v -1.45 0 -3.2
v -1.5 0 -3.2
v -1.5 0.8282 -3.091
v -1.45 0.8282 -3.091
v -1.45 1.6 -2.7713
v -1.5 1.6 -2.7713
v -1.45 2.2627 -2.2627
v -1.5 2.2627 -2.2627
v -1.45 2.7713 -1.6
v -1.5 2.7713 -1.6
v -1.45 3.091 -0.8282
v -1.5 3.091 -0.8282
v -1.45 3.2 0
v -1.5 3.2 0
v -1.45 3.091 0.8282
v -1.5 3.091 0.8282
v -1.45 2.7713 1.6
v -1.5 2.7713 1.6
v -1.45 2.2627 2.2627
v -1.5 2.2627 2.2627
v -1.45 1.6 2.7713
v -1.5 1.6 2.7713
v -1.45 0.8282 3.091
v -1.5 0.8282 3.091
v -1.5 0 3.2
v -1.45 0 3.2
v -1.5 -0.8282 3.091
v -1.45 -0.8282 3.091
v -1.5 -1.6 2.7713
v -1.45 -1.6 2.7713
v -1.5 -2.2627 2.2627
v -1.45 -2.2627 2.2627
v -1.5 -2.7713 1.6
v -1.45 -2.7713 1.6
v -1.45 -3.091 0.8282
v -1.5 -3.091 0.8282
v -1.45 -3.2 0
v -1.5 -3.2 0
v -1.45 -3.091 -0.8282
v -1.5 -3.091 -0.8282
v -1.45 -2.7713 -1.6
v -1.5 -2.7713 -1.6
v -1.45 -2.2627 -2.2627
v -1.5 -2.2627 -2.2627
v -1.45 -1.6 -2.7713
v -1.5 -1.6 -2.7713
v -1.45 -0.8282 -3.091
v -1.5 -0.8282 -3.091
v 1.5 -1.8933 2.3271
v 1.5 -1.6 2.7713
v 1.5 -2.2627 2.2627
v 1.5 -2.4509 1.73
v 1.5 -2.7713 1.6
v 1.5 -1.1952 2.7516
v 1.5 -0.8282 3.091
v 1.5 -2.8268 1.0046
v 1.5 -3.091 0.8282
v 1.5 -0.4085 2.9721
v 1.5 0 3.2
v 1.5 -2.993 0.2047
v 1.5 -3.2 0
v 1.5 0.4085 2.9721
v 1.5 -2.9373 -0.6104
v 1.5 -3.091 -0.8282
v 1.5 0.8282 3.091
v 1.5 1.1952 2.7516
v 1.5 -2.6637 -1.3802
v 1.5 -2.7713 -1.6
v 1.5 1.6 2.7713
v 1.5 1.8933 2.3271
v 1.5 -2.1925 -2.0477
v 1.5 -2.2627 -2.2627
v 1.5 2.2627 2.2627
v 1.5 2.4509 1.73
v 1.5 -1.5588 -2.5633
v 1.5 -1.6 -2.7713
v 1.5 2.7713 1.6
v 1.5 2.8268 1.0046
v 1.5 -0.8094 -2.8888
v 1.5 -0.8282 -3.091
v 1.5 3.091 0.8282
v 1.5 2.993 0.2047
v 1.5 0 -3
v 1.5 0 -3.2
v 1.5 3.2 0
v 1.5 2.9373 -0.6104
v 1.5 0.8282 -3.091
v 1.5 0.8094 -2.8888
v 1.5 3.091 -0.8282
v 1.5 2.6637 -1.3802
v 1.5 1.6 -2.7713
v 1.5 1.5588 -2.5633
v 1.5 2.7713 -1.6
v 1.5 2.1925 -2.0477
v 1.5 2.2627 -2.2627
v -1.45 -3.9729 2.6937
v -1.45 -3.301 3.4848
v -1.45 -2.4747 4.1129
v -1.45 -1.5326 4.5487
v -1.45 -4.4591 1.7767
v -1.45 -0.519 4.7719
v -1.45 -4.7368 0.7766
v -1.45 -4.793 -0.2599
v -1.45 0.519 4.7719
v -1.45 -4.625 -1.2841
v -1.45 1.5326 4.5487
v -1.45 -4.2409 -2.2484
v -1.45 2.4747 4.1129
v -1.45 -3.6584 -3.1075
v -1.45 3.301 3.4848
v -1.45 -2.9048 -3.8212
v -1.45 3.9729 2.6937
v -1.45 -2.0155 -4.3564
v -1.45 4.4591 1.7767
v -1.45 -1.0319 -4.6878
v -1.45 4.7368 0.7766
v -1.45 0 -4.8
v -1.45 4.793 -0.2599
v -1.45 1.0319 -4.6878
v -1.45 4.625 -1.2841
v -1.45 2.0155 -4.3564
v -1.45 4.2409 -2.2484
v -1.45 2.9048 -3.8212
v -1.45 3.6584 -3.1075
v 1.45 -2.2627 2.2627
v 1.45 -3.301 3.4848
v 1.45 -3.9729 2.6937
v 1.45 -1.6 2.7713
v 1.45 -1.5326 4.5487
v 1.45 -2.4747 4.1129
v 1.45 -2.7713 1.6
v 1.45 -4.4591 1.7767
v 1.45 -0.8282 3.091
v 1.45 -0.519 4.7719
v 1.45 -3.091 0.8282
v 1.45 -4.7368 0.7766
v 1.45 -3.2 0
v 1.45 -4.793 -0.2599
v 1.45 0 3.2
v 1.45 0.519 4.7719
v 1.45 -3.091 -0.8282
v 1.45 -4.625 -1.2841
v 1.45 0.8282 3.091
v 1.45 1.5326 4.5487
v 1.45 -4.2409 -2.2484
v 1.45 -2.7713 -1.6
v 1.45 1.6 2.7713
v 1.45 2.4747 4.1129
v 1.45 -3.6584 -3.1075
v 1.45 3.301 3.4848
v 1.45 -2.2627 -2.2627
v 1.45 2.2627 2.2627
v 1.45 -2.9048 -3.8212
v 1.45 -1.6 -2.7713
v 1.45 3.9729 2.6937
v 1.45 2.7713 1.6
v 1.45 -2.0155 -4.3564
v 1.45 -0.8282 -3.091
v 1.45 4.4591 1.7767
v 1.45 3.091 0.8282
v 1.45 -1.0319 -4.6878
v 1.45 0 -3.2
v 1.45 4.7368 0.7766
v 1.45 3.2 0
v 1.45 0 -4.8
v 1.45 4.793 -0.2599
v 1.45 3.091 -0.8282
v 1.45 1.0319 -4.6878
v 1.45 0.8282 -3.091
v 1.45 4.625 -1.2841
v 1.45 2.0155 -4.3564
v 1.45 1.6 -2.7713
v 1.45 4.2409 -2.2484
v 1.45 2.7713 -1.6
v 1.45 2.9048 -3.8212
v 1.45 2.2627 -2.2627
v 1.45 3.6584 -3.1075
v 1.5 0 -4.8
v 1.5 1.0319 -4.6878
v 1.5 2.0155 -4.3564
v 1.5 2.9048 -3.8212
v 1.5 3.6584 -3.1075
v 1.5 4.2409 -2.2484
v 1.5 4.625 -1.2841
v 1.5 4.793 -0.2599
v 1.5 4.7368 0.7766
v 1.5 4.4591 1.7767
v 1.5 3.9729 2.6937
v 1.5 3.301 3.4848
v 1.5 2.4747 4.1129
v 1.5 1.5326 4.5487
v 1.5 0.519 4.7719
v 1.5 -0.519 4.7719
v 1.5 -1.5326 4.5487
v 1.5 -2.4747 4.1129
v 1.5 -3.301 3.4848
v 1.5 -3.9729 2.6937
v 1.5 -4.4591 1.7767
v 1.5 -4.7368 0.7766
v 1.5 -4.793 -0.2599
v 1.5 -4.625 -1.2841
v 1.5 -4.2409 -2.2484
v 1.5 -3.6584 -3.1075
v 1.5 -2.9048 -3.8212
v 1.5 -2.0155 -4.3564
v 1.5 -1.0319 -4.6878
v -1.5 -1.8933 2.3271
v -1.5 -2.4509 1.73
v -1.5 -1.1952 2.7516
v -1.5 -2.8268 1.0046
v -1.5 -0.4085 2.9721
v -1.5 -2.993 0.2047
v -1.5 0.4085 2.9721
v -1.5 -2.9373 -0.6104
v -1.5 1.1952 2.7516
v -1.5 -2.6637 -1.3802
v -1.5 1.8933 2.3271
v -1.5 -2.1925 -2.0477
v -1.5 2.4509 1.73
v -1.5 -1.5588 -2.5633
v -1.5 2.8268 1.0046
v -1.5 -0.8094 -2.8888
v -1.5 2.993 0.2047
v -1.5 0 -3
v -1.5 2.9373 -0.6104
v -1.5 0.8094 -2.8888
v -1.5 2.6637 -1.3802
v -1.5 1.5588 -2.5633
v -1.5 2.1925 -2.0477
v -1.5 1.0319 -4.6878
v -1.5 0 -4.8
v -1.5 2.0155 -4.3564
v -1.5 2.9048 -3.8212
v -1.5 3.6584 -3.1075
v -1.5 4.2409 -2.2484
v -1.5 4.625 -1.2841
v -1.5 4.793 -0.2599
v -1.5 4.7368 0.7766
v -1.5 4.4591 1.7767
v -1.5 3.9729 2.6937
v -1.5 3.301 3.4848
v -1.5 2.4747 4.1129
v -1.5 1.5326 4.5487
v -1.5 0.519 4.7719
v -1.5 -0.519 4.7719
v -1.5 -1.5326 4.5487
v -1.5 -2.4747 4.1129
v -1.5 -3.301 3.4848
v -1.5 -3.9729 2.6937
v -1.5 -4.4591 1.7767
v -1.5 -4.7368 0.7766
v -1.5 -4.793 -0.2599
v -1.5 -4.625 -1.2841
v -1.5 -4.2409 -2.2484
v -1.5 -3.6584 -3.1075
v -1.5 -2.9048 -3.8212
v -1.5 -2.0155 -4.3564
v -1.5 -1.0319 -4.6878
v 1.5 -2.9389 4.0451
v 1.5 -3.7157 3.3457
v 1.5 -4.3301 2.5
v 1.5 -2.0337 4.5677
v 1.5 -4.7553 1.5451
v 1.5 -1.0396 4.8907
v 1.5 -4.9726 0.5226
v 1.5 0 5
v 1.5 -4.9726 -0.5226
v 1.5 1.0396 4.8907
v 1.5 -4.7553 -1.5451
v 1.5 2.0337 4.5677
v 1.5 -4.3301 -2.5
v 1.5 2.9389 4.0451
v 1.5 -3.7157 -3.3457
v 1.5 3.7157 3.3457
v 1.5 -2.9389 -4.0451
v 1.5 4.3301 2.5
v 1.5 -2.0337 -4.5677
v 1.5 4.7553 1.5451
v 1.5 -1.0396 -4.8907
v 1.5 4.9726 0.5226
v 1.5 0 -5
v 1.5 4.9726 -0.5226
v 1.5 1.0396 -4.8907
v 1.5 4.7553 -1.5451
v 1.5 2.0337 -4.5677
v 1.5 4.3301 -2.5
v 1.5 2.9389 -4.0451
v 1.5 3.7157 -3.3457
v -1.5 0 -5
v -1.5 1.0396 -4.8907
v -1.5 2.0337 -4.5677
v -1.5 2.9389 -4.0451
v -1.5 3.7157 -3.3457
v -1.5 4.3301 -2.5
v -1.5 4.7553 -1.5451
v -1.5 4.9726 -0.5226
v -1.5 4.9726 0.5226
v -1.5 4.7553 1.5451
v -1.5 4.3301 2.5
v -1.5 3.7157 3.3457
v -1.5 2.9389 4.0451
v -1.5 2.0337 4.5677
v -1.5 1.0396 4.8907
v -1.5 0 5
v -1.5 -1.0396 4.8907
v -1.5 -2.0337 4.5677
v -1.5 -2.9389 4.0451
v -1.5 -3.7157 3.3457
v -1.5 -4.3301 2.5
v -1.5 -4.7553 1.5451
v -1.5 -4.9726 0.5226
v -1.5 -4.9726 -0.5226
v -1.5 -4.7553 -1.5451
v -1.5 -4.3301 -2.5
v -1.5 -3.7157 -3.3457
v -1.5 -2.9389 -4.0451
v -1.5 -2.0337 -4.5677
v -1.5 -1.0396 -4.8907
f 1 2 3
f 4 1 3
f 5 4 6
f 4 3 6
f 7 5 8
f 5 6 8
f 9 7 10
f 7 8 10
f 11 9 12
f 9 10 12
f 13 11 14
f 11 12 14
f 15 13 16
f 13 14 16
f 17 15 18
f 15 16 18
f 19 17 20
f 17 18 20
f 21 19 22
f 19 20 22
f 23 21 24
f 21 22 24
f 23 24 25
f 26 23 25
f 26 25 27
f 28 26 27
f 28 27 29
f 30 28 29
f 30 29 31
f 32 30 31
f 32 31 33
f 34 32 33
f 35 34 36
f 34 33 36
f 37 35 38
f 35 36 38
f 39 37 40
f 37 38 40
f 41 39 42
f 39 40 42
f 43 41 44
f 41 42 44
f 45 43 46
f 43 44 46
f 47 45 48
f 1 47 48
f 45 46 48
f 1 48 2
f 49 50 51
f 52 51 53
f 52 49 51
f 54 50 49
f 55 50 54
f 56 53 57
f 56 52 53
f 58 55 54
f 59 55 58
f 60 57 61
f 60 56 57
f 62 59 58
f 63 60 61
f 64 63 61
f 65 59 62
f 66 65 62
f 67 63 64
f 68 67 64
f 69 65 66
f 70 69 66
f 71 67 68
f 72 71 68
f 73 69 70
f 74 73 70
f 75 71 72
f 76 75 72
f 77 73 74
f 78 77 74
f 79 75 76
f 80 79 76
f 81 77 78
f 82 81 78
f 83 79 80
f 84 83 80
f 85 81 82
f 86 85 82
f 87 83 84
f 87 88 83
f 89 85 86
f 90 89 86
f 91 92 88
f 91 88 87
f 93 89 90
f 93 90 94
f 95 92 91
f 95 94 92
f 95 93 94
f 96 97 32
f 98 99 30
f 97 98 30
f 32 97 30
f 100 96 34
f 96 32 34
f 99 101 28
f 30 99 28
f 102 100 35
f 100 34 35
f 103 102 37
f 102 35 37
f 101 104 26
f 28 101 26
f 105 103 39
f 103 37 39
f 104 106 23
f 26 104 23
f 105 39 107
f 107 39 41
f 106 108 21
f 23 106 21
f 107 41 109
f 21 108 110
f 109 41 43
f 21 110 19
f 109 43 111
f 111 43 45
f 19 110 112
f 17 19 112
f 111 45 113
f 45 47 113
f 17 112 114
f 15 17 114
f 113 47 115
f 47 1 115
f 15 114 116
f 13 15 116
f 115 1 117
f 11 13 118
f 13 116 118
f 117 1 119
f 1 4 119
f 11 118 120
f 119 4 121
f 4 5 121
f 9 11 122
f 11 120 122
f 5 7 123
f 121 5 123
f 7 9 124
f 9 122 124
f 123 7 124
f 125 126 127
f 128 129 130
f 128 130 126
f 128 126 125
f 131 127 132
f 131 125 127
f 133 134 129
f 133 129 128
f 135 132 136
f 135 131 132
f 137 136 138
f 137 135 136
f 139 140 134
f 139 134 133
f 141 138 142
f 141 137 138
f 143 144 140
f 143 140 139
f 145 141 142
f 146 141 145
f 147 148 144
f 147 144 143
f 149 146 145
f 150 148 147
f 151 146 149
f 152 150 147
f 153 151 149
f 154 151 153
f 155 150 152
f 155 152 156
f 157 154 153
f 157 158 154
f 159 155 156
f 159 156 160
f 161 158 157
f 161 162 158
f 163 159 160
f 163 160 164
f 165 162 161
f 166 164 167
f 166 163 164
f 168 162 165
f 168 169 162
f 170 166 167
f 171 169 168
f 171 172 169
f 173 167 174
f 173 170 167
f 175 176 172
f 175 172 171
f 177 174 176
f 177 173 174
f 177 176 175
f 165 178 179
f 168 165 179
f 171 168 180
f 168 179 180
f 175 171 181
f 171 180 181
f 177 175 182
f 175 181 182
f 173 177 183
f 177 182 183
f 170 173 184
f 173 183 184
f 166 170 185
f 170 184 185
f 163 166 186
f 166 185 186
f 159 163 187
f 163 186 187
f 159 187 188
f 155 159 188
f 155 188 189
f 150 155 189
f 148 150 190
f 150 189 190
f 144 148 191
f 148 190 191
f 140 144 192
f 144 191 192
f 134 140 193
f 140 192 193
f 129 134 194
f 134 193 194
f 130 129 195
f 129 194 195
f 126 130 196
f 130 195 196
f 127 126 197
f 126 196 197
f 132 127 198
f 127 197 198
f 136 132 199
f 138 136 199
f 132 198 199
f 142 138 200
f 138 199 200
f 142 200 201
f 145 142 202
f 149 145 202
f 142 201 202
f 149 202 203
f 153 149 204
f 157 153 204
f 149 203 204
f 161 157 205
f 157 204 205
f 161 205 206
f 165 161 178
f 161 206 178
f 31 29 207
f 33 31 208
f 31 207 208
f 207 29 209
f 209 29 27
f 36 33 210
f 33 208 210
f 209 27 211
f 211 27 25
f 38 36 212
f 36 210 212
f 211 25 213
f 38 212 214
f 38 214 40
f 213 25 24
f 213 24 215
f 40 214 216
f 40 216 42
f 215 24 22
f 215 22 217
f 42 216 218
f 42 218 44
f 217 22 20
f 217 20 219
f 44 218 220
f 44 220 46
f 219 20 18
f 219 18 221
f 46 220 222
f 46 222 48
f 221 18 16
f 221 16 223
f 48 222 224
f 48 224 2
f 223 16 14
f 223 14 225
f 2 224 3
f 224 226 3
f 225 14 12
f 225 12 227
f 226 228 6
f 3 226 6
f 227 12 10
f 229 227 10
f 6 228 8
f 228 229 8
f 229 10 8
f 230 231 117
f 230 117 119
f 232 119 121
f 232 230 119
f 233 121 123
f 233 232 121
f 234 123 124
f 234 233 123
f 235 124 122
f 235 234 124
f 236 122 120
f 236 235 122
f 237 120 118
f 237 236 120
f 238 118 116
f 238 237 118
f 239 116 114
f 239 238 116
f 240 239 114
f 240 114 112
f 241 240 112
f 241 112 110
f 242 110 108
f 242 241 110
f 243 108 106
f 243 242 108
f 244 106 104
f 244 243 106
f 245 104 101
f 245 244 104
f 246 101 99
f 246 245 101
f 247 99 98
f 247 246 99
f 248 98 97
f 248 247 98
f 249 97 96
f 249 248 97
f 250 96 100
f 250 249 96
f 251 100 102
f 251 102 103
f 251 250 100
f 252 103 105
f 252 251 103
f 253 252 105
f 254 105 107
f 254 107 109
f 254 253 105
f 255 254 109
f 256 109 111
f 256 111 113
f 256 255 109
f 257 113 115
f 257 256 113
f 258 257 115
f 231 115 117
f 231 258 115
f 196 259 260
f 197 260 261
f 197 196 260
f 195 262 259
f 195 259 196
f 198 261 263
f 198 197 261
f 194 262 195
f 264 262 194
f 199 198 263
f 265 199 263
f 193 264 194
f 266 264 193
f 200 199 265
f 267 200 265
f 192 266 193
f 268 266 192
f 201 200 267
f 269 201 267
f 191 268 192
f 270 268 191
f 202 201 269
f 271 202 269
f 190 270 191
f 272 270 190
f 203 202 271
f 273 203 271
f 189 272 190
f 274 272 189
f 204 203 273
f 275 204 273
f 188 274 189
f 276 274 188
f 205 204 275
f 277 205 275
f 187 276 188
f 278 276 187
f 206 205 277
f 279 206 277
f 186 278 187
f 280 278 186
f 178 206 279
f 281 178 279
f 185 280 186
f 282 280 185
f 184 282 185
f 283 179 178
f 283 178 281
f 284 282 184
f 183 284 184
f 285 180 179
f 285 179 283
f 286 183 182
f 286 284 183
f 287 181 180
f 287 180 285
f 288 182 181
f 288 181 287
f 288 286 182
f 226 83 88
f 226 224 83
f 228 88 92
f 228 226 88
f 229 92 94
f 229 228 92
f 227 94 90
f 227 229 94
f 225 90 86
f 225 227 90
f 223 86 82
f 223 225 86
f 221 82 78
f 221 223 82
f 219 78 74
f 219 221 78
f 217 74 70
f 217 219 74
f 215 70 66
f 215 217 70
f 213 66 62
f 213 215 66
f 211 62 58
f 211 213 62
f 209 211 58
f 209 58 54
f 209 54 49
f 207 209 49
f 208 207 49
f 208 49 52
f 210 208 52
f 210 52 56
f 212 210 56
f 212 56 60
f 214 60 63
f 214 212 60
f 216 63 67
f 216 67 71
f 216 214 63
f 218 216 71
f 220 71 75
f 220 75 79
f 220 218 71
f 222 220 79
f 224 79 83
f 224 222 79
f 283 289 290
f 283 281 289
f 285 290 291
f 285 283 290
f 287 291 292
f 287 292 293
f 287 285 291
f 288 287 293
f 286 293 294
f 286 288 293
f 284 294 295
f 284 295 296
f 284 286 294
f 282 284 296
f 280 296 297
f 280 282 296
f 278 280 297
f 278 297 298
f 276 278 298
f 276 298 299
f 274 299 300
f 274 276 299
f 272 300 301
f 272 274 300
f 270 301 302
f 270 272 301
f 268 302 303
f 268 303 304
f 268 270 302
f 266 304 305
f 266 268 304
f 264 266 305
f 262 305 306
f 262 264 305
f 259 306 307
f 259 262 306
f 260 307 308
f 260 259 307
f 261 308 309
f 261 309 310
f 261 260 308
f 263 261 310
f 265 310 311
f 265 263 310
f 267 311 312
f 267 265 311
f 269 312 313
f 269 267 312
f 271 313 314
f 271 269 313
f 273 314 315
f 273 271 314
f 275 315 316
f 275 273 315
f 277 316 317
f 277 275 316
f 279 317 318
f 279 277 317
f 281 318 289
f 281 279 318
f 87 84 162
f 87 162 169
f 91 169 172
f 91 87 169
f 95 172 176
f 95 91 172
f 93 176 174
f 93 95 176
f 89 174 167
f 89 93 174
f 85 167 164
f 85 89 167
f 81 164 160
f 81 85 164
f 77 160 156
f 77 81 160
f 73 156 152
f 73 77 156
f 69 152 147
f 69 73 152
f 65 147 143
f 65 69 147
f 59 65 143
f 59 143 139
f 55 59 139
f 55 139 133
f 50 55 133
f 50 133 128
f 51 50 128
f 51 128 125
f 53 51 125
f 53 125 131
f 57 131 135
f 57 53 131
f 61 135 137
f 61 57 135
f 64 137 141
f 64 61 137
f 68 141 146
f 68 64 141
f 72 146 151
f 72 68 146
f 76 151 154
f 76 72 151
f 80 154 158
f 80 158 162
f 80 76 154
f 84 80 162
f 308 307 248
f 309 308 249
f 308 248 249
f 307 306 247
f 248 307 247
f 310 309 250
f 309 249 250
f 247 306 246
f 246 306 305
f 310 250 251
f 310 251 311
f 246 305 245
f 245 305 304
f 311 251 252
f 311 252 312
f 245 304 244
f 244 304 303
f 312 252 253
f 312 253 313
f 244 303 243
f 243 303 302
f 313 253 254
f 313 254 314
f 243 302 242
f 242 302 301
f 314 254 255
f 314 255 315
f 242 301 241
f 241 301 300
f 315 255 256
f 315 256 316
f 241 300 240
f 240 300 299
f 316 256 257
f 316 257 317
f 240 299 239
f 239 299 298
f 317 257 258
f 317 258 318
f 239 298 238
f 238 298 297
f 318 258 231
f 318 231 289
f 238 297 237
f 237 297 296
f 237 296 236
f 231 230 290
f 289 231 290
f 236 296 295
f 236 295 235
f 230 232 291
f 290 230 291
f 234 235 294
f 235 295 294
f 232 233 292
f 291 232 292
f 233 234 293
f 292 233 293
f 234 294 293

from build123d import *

# Parameters (mm, degrees)
SKETCH1_R           = 5
SKETCH1_R_2         = 3
BOSS_EXTRUDE1_DEPTH = 1.5
SKETCH2_R           = 4.8
SKETCH2_R_2         = 3.2
CUT_EXTRUDE1_DEPTH  = 0.05


with BuildPart() as part:
    # Sketch1 → Boss-Extrude1 (new, symmetric)
    with BuildSketch(Plane(origin=(0, 0, 0), x_dir=(0, 0, -1), z_dir=(1, 0, 0))):
        Circle(SKETCH1_R)
        Circle(SKETCH1_R_2, mode=Mode.SUBTRACT)
    extrude(amount=BOSS_EXTRUDE1_DEPTH, both=True)

    # Sketch2 → Cut-Extrude1 (cut)
    with BuildSketch(Plane(origin=(1.5, 0, 0), x_dir=(0, 0, -1), z_dir=(1, 0, 0))):
        Circle(SKETCH2_R)
        Circle(SKETCH2_R_2, mode=Mode.SUBTRACT)
    cut_extrude1 = extrude(amount=-CUT_EXTRUDE1_DEPTH, mode=Mode.SUBTRACT)

    # Mirror1: Cut-Extrude1 across plane
    add(cut_extrude1.mirror(Plane(origin=(0, 0, 0), x_dir=(0, 0, 1), z_dir=(1, 0, 0))), mode=Mode.SUBTRACT)


solid = part.part
